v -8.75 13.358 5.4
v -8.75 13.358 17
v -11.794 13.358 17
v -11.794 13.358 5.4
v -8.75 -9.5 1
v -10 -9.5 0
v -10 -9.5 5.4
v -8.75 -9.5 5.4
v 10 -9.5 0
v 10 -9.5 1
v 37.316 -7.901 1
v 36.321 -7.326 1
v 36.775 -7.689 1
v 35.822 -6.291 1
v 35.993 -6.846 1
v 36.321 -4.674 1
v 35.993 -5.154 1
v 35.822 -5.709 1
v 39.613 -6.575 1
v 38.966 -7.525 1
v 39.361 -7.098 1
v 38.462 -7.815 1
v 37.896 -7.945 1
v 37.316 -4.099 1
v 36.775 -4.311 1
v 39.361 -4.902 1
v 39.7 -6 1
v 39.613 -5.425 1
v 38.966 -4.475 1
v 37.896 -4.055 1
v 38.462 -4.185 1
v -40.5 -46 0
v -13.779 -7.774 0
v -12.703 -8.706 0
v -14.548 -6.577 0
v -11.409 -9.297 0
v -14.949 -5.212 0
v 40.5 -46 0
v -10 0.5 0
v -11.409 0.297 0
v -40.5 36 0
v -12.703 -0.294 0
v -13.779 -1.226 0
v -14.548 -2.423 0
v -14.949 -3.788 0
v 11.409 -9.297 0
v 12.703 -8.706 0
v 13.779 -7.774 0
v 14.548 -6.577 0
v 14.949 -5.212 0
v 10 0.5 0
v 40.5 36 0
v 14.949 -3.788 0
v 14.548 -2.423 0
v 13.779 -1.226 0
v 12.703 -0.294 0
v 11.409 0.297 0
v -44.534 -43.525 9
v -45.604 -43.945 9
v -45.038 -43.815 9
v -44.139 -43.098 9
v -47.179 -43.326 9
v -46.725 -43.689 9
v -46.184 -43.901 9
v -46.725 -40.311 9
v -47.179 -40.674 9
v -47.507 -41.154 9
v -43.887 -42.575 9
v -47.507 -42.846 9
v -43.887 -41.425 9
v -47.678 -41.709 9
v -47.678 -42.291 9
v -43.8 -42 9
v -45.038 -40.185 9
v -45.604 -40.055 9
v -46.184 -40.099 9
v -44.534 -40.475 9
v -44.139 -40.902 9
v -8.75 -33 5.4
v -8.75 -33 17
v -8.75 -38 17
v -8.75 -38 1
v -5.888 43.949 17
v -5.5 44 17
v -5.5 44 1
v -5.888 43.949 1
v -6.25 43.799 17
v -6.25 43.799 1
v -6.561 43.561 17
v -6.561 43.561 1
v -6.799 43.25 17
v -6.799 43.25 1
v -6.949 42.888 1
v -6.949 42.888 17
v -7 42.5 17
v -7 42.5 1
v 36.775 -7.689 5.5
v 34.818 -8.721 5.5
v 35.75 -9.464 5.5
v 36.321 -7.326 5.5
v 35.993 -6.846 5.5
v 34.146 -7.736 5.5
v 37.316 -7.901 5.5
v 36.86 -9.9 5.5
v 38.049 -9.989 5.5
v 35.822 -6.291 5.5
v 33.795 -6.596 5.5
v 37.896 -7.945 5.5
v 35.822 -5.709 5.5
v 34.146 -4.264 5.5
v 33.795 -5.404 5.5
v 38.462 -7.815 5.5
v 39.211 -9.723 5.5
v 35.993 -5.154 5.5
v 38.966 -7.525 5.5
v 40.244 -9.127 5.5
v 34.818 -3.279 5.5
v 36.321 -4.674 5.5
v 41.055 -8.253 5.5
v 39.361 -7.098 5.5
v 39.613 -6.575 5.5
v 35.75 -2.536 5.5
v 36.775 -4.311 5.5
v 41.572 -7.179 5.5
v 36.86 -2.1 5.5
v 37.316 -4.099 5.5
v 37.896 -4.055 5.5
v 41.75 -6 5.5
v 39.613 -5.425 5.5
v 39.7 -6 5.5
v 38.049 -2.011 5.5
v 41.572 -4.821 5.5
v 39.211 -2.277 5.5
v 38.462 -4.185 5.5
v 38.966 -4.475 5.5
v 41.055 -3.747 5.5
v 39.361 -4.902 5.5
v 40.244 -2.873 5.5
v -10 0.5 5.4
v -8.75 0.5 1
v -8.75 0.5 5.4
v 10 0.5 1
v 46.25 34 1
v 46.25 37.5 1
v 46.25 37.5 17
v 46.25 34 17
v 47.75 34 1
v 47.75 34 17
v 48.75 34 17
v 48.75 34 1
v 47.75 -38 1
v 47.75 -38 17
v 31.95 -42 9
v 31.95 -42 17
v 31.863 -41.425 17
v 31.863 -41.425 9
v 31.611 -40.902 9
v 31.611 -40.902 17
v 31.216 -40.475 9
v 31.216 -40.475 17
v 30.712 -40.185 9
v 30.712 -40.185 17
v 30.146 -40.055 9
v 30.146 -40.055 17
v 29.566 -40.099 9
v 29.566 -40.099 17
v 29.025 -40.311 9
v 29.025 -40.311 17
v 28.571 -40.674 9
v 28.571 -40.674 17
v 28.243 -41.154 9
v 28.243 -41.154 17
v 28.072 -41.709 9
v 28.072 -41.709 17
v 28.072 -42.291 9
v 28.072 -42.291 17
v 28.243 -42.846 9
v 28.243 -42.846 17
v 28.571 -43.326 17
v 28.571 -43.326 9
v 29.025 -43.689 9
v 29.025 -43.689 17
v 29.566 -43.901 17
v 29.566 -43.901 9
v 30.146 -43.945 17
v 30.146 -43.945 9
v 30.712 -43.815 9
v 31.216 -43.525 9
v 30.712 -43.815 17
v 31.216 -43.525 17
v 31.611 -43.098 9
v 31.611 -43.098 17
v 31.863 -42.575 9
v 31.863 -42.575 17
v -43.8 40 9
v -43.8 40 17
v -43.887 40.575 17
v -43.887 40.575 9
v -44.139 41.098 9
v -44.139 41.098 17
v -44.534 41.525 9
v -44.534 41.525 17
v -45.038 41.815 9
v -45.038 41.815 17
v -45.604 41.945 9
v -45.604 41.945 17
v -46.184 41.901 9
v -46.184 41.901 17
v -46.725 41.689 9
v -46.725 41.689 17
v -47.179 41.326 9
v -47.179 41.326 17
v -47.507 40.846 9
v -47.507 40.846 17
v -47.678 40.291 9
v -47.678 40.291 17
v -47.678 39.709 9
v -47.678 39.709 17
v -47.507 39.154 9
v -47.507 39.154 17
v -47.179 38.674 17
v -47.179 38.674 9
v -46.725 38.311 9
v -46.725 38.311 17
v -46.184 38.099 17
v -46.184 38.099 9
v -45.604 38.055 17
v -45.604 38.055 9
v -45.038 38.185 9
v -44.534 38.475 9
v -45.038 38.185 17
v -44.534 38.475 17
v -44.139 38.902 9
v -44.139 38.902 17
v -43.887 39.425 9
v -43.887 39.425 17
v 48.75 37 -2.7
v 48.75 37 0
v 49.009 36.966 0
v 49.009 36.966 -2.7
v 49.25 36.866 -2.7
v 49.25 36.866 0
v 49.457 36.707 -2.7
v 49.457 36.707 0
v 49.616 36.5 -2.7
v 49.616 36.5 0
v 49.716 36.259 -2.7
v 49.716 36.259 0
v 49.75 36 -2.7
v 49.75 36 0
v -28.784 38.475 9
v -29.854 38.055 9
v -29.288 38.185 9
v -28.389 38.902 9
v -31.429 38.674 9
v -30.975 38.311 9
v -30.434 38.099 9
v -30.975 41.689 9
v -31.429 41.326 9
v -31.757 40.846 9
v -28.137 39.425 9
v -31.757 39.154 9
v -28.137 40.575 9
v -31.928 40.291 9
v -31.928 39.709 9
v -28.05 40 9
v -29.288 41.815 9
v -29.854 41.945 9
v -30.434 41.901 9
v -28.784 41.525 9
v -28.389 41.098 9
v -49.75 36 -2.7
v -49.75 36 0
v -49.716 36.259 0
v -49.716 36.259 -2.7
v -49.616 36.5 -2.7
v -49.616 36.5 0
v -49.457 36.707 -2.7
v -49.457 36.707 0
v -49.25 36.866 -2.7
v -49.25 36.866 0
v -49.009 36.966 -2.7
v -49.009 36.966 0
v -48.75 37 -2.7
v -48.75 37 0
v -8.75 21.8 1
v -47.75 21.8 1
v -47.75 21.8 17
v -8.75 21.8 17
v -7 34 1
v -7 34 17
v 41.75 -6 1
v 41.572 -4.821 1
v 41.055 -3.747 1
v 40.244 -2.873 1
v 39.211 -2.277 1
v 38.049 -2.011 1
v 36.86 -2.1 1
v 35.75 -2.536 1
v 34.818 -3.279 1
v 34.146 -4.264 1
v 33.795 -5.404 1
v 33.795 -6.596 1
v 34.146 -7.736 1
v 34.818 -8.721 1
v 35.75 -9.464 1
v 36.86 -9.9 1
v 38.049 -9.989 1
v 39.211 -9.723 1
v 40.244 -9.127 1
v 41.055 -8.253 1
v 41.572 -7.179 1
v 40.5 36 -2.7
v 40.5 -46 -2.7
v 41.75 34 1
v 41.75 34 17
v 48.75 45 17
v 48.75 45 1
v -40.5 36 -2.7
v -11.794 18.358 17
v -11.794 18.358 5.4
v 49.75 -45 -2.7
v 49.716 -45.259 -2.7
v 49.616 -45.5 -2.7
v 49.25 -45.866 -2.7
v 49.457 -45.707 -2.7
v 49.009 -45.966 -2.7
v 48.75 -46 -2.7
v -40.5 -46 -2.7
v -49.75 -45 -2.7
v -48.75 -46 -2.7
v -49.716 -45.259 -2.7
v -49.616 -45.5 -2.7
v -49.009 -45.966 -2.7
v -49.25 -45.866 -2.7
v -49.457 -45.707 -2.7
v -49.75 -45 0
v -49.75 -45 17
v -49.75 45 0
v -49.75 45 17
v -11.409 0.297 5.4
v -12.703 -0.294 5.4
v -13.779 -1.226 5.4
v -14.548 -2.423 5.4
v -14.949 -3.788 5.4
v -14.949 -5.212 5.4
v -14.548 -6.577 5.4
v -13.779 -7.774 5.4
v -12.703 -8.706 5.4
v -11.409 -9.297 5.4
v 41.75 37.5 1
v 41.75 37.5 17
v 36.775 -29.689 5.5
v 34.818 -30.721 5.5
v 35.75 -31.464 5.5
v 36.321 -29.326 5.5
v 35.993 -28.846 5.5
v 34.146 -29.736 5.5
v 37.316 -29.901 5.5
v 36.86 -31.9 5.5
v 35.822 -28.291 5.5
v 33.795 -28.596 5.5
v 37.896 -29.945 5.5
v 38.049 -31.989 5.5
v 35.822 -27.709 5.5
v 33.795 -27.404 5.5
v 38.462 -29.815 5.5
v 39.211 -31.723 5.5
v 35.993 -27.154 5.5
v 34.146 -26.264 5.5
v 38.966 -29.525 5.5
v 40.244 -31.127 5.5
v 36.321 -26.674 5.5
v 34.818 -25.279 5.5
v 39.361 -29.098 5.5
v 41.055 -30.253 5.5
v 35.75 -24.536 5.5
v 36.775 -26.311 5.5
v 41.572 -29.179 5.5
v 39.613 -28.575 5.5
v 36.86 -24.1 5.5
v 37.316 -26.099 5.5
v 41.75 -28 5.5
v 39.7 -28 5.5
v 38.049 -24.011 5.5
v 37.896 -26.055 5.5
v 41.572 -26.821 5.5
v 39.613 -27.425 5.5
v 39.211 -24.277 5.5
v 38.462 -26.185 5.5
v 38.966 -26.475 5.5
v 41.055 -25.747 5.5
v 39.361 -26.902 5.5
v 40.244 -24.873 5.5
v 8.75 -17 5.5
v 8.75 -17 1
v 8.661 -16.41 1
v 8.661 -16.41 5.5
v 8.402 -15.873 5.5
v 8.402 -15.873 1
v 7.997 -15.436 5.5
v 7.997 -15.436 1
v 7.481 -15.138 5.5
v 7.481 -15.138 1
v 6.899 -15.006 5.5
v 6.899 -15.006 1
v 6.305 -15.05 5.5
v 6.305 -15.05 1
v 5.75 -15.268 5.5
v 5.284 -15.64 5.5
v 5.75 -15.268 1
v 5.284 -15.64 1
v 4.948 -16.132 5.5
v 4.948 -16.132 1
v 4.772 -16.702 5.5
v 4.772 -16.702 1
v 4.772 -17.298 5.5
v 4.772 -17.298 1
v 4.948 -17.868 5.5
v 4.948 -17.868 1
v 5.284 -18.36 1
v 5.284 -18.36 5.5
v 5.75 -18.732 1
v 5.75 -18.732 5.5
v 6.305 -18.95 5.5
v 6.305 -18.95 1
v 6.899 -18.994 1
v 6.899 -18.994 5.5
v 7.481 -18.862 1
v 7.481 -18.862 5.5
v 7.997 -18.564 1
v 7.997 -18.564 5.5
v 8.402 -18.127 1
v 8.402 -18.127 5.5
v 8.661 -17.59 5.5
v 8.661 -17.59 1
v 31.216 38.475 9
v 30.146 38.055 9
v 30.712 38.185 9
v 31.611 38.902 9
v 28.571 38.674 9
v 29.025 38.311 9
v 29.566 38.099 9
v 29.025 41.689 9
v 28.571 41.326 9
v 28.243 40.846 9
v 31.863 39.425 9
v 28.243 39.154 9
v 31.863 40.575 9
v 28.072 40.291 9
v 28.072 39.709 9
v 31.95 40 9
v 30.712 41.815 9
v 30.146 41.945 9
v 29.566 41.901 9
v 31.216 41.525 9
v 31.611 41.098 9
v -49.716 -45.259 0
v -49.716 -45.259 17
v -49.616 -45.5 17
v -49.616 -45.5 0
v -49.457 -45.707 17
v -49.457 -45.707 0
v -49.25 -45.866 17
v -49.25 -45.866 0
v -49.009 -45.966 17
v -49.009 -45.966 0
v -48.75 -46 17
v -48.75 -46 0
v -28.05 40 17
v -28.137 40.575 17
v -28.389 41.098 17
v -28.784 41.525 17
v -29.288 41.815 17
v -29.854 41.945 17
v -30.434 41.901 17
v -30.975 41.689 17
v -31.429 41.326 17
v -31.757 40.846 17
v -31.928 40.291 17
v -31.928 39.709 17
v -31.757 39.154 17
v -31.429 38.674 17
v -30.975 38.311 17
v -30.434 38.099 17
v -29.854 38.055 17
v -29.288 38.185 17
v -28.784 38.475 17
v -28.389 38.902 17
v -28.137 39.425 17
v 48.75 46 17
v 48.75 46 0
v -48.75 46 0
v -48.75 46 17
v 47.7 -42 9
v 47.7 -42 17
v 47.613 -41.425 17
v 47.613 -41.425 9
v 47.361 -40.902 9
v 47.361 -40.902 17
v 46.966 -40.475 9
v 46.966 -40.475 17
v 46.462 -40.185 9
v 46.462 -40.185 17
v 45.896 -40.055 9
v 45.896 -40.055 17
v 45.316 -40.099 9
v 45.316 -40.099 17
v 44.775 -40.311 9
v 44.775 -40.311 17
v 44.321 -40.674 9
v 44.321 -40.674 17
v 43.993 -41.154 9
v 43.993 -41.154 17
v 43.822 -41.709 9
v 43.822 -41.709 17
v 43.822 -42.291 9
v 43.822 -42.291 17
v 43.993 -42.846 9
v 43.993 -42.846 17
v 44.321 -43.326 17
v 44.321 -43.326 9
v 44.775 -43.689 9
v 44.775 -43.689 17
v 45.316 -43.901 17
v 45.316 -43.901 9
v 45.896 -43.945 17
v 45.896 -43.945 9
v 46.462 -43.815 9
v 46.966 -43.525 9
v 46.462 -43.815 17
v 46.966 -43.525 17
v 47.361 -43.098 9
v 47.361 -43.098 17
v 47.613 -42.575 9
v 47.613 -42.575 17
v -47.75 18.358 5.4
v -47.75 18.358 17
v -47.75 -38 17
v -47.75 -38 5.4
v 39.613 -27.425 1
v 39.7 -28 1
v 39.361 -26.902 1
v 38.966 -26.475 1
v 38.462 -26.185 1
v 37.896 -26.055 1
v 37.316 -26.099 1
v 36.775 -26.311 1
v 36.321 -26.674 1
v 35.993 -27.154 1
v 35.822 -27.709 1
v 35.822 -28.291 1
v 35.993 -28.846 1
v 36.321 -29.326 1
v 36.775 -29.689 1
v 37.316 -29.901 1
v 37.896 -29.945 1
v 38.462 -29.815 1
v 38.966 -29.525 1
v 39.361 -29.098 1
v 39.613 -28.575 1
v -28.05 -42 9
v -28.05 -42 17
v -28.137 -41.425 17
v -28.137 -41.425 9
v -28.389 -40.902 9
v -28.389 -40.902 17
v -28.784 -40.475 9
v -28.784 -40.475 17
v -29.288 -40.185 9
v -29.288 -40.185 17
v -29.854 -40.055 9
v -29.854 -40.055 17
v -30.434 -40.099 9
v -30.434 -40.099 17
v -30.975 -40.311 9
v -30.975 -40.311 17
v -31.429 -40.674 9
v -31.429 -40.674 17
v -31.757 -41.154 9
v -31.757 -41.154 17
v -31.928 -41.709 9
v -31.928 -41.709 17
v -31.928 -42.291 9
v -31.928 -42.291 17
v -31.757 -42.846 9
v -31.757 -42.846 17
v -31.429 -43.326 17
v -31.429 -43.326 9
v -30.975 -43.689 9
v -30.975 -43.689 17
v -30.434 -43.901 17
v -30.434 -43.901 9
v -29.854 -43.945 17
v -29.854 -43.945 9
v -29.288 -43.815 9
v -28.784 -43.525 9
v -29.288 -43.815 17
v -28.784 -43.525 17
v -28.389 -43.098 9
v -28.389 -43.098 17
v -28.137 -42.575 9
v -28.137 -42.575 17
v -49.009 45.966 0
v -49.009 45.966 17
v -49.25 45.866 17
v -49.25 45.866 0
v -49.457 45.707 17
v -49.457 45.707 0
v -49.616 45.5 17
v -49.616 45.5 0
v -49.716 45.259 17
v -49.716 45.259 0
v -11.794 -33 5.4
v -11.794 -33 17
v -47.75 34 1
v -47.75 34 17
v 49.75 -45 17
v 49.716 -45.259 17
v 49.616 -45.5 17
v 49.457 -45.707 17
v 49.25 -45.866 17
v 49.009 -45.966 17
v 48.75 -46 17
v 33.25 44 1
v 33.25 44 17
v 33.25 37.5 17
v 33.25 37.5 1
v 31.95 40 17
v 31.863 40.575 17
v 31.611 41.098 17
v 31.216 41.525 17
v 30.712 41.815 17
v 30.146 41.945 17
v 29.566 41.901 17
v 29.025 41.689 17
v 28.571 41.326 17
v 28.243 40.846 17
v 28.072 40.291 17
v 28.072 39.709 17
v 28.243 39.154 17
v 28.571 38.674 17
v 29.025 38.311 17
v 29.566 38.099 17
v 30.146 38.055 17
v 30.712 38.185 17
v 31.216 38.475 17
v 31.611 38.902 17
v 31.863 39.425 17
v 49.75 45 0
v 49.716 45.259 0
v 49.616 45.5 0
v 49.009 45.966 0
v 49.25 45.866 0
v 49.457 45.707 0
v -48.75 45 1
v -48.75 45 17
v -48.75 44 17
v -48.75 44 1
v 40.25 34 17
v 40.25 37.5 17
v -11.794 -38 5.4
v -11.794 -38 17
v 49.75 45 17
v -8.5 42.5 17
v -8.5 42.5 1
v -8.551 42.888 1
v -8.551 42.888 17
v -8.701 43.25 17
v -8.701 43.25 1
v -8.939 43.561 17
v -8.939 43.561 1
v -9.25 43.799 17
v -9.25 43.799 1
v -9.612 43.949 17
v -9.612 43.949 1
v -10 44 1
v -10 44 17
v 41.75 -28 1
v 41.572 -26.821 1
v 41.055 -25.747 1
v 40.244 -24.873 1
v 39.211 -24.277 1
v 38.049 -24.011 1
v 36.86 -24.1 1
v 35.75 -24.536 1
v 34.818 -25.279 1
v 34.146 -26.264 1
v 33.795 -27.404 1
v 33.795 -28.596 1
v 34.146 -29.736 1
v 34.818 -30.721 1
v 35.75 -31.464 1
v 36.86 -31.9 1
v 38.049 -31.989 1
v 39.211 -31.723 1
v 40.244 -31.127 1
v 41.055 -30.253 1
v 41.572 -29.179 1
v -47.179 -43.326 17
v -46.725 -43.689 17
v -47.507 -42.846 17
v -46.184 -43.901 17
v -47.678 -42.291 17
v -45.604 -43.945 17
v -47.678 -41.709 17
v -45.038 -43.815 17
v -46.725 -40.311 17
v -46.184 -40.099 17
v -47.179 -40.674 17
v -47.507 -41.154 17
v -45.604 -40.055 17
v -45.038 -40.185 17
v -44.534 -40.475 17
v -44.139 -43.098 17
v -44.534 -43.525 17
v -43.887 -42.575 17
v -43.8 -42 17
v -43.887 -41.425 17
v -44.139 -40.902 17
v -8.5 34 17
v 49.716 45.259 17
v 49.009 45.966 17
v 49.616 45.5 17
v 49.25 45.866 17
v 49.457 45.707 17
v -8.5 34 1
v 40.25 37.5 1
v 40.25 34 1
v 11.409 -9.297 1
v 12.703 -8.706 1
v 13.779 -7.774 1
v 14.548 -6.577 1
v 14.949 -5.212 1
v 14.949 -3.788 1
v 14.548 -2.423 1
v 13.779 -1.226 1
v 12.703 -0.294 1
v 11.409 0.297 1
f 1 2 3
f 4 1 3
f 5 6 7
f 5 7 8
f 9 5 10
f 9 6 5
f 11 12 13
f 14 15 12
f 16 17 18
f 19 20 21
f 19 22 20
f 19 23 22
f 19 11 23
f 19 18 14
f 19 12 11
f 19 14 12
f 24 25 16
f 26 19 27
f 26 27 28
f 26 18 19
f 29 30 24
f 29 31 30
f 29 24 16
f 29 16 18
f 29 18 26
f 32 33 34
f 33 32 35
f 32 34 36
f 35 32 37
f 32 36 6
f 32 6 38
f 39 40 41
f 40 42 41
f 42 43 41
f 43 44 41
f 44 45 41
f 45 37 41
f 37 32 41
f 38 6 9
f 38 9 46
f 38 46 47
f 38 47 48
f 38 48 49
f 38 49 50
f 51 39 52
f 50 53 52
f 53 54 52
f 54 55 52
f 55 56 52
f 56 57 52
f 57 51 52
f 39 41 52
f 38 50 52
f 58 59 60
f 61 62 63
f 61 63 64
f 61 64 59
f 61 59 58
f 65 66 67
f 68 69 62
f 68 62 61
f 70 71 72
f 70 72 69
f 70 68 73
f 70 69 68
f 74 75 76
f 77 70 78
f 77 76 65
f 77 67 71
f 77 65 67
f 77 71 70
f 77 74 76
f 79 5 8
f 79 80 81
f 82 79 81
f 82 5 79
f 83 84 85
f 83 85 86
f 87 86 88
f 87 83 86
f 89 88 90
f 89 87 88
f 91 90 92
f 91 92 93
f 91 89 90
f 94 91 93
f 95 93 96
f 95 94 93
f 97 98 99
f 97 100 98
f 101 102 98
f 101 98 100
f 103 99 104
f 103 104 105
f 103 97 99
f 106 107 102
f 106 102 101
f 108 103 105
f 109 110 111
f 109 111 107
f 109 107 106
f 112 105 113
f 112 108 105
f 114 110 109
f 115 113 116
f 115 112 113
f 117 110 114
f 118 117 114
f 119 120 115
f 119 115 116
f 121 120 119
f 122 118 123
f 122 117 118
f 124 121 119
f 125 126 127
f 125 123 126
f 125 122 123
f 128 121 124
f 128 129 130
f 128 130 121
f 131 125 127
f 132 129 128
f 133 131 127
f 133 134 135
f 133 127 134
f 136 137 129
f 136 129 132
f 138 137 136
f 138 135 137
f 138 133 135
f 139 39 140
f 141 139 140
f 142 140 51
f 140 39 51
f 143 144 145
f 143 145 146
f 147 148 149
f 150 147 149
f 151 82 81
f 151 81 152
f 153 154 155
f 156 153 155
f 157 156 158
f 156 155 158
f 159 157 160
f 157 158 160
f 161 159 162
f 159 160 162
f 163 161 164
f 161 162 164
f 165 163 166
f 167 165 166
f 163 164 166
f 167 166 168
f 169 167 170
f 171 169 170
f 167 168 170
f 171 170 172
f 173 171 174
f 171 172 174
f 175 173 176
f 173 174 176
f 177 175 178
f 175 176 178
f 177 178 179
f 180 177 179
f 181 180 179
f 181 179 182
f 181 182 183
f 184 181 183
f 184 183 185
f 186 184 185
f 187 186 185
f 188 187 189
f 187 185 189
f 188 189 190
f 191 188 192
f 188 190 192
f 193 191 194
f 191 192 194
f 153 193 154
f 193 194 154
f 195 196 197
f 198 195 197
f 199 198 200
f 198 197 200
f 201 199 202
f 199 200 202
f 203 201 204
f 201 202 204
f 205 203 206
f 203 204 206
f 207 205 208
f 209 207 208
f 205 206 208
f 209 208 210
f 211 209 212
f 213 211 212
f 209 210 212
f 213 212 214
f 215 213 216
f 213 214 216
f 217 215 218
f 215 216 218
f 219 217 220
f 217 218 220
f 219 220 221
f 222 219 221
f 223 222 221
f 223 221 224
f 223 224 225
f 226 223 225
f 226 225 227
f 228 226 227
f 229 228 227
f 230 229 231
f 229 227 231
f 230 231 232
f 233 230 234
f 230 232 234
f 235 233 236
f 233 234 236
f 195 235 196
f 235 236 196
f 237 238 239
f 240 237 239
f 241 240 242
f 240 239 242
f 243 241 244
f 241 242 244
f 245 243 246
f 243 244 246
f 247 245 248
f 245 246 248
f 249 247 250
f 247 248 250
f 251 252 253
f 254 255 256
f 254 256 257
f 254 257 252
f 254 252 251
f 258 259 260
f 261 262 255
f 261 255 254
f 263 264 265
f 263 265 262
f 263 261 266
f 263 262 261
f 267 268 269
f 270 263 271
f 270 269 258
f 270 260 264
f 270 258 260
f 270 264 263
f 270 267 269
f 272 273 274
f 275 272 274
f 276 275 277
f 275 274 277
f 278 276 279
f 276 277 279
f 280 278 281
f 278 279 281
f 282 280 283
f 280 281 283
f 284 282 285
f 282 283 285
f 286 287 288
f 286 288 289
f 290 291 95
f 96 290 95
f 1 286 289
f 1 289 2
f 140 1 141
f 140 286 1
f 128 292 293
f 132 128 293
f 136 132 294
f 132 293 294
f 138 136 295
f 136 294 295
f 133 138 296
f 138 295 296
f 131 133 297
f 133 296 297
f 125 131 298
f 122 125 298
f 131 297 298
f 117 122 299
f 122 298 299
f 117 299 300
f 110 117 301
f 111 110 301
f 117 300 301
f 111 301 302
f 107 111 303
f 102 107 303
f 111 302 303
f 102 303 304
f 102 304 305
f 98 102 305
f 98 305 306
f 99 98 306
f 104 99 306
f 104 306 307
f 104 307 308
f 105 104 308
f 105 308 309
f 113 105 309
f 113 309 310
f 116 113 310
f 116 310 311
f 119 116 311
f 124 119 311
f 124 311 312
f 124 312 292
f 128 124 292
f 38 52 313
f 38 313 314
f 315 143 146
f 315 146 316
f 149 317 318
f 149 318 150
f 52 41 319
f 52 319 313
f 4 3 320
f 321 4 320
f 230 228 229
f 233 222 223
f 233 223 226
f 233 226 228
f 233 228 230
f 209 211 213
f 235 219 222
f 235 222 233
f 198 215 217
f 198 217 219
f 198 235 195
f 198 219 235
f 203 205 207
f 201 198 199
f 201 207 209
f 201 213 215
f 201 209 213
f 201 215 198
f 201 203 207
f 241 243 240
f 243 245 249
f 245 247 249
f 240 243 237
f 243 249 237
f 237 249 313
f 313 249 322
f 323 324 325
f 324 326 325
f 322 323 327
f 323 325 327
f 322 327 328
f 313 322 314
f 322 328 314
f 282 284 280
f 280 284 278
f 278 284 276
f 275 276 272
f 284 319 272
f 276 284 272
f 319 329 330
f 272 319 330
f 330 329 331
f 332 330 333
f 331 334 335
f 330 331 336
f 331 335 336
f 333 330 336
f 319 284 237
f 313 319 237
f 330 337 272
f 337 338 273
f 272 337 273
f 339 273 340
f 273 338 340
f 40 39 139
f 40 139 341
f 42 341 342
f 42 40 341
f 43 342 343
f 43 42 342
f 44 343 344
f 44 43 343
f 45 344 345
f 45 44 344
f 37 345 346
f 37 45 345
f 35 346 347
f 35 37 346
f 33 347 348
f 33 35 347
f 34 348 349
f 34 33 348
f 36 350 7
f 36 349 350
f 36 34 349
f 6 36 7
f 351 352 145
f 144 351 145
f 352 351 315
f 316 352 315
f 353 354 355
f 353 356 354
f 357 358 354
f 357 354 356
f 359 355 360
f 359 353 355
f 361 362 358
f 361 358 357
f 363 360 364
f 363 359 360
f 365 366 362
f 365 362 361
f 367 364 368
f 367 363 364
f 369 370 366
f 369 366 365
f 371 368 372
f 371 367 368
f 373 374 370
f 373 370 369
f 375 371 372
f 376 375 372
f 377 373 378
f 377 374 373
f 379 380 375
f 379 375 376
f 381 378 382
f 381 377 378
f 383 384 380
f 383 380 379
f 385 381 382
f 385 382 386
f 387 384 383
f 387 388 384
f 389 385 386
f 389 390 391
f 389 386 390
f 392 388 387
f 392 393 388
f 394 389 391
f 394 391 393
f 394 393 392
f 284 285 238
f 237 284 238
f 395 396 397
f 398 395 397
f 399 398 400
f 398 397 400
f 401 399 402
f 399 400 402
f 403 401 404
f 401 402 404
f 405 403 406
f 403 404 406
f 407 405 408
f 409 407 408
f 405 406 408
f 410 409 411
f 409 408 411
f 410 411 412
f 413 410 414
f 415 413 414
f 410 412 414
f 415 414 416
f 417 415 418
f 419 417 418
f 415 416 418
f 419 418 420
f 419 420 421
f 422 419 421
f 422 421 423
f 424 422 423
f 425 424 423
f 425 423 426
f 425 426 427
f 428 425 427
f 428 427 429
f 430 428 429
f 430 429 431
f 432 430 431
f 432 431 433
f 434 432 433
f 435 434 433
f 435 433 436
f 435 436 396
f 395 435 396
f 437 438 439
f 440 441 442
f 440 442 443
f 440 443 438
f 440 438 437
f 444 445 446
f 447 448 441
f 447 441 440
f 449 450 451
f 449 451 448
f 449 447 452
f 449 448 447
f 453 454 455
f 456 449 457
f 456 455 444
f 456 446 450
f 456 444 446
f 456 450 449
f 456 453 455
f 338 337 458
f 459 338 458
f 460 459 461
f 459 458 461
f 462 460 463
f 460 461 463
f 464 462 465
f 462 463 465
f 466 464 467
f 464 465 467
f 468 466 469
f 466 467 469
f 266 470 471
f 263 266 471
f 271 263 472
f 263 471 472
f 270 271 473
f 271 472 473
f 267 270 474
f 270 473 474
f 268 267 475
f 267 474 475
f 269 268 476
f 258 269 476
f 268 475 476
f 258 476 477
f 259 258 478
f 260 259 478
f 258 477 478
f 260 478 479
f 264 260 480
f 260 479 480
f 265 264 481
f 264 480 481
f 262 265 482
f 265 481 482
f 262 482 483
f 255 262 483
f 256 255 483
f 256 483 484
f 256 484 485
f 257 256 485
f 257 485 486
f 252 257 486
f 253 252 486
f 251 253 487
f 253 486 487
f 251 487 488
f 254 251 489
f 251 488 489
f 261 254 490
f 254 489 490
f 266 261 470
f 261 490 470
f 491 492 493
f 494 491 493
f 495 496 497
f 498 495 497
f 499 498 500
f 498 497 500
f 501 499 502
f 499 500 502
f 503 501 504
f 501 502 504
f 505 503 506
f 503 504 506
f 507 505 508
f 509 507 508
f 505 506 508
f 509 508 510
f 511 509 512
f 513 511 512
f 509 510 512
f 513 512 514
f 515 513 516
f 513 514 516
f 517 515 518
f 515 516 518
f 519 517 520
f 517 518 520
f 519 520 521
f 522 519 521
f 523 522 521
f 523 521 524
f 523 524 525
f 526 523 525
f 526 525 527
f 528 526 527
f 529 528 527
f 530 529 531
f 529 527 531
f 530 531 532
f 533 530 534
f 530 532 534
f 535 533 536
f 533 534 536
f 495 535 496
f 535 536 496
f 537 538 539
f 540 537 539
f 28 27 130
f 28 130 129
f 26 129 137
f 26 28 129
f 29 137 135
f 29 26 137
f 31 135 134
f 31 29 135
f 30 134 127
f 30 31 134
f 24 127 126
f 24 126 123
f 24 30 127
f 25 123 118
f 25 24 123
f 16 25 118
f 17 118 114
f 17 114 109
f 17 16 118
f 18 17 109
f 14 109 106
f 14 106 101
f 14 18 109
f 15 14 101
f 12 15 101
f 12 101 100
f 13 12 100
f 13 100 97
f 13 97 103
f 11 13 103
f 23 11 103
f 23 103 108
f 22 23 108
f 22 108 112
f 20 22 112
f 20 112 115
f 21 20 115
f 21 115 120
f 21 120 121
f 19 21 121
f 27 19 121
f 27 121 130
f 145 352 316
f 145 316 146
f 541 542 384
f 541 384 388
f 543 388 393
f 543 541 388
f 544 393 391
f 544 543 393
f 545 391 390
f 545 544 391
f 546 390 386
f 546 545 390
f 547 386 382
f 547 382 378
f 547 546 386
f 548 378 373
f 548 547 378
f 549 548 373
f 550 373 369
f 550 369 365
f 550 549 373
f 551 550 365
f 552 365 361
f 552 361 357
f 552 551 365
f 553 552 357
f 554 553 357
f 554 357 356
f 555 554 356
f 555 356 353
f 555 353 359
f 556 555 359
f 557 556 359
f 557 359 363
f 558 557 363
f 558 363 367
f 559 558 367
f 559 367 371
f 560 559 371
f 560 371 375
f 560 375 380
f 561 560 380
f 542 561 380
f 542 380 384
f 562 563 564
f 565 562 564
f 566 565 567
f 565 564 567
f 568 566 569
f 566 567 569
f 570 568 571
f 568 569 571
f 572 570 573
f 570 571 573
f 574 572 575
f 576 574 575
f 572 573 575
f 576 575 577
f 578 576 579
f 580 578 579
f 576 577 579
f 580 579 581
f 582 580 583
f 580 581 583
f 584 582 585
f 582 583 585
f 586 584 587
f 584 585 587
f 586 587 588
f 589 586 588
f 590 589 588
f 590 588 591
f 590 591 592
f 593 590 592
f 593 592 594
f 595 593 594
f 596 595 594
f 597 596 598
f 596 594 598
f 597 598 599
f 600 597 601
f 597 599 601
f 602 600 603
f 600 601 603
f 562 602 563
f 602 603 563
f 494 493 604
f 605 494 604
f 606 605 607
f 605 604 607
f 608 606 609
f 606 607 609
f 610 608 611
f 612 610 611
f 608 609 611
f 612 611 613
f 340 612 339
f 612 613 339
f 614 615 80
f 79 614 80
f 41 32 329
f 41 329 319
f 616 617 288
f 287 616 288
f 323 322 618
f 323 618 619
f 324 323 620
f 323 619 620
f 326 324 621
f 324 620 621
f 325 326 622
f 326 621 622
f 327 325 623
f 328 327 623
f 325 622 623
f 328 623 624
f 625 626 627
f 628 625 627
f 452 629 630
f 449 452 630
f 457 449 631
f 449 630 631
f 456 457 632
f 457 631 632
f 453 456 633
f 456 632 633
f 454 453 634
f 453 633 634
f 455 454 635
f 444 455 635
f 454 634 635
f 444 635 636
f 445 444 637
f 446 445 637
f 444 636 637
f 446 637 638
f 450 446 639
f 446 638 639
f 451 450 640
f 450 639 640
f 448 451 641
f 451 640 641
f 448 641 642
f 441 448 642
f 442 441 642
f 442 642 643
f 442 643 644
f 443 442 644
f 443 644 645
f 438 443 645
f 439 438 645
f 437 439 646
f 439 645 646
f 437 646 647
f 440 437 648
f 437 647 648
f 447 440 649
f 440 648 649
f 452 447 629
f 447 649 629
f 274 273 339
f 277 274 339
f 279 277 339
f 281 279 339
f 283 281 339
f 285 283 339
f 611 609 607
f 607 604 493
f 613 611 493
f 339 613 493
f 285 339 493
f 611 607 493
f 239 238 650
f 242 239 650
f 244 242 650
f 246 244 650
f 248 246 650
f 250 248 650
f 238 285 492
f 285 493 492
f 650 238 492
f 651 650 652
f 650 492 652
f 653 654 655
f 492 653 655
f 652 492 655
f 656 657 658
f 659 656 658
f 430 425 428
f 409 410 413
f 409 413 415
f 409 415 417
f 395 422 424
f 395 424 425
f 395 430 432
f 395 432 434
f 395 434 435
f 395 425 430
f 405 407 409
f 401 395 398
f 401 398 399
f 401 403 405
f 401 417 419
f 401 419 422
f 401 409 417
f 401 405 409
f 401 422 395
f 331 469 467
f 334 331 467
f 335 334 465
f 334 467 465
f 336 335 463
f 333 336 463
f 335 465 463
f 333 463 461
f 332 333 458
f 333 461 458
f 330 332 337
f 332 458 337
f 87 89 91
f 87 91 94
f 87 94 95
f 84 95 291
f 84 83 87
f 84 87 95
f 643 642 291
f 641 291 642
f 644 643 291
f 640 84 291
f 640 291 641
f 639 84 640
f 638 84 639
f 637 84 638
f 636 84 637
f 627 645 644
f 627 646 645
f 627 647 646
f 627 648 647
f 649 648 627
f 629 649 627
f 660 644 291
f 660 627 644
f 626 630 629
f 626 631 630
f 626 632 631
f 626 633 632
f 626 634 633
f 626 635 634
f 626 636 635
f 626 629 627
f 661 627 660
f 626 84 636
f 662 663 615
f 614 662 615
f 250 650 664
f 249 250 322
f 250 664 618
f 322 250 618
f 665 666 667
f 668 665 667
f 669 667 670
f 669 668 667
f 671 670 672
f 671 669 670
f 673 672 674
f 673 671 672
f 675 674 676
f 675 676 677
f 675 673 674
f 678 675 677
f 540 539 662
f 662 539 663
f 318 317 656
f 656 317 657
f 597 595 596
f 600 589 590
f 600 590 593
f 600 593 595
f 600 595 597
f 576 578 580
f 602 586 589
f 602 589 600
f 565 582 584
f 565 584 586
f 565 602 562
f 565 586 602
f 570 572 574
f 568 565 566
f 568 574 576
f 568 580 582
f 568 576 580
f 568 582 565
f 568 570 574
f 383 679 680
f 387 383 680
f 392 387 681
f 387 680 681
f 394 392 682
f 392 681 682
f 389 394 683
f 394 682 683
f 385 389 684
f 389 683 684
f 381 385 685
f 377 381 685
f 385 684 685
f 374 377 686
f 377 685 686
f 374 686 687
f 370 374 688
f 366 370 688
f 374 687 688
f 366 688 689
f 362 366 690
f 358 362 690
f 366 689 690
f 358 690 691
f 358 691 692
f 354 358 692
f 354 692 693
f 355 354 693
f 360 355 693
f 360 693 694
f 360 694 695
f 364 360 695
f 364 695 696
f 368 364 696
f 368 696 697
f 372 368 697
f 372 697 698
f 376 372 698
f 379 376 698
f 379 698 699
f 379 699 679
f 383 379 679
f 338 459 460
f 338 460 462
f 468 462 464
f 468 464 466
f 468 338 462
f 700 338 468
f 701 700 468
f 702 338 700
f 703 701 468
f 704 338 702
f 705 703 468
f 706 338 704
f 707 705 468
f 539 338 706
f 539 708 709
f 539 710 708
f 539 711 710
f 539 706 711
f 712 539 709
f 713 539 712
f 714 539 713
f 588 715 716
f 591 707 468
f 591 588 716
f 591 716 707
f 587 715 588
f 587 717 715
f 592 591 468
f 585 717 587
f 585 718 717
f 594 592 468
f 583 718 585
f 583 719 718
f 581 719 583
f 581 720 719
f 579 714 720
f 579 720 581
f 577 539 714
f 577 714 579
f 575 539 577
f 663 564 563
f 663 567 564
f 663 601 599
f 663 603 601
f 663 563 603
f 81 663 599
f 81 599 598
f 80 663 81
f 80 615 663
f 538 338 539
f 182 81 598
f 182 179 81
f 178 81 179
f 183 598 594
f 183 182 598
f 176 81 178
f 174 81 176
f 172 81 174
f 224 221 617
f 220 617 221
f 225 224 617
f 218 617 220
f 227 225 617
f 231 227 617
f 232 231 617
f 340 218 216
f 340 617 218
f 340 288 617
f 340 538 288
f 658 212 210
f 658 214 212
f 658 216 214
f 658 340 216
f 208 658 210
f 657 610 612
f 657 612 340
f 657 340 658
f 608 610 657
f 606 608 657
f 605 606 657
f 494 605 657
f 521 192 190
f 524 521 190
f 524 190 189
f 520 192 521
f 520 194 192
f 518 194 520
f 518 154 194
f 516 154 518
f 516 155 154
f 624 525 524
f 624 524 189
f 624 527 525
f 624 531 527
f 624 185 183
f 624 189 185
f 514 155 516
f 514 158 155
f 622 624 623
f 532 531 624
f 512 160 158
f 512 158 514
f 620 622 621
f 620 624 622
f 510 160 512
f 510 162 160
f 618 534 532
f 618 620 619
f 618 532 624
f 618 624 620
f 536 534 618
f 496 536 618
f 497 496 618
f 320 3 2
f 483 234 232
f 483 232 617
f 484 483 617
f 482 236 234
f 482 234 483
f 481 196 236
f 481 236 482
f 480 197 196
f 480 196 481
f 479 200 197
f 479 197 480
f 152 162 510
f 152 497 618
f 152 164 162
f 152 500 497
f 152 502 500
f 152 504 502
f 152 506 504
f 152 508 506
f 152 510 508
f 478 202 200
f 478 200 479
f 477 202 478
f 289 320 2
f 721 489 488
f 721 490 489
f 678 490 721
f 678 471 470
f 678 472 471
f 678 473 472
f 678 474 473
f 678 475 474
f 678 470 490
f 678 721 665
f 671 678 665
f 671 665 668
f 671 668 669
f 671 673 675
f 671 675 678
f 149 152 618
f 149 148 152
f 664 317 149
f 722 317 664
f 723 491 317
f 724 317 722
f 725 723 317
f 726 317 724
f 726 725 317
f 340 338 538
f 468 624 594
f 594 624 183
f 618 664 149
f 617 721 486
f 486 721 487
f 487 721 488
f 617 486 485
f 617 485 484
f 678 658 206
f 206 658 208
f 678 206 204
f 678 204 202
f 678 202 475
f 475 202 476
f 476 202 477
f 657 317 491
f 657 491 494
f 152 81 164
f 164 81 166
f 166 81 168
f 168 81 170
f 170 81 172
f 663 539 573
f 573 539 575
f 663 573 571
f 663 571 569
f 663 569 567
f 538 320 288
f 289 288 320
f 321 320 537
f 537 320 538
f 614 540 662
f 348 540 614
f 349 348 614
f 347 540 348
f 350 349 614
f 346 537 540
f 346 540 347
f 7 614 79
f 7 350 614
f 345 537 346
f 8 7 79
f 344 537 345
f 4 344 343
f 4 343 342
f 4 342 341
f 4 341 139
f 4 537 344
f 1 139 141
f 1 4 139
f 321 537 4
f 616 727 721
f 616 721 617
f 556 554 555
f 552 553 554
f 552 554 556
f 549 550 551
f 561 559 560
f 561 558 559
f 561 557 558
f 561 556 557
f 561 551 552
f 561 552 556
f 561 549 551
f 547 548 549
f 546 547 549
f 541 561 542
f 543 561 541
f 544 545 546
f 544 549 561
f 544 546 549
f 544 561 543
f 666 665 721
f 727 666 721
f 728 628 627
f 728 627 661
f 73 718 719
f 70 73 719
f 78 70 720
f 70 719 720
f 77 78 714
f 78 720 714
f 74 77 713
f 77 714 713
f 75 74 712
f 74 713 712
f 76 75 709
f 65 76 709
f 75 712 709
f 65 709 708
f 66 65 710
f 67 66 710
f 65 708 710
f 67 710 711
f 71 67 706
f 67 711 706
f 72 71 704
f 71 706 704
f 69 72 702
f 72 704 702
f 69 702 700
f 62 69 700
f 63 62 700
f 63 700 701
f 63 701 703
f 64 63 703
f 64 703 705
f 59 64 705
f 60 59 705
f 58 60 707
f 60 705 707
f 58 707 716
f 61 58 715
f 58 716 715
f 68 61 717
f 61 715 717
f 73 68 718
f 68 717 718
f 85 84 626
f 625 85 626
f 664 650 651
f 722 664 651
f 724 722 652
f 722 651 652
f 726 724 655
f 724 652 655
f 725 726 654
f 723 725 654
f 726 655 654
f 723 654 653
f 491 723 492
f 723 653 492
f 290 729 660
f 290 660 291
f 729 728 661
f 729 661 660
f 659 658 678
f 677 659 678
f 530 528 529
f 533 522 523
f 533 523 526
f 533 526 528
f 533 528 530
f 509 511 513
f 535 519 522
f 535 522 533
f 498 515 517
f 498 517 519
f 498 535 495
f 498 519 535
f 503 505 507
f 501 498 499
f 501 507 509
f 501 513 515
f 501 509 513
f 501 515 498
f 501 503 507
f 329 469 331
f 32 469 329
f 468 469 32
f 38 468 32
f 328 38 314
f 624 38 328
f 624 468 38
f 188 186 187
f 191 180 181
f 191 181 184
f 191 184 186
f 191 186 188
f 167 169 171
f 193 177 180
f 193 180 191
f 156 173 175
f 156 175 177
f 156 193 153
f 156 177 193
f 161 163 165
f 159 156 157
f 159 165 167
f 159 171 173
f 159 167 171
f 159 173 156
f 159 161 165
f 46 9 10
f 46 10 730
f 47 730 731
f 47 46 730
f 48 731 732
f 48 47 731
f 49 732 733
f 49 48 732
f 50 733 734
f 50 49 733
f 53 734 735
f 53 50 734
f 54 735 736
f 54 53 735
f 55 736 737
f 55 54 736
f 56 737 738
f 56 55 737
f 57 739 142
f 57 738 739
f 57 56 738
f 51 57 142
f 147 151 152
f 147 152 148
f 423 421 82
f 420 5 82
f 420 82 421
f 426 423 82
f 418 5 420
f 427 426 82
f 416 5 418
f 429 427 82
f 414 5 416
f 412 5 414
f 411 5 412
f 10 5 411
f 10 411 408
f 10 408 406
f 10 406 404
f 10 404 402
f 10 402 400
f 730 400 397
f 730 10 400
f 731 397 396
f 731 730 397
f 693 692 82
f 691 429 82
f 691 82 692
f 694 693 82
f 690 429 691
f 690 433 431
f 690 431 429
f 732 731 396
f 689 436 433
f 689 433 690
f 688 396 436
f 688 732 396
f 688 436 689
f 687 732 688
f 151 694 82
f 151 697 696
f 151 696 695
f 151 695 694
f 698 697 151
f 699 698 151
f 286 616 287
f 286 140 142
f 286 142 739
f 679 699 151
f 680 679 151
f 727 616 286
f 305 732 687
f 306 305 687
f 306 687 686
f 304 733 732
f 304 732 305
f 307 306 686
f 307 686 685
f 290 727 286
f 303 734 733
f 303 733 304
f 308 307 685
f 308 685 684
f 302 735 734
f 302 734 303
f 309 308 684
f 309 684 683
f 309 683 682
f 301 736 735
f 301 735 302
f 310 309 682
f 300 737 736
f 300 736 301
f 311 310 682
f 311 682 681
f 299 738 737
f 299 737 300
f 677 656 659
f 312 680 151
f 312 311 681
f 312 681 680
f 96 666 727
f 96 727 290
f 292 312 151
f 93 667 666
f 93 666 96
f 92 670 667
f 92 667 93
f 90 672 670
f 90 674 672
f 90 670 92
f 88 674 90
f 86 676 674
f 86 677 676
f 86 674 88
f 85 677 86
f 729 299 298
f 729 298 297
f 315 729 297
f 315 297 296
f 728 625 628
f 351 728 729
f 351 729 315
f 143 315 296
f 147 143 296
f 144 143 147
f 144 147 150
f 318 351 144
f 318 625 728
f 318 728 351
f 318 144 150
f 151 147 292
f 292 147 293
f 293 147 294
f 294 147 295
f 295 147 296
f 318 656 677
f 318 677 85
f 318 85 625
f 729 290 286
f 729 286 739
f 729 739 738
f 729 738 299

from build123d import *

# Parameters (mm, degrees)
PAD020_DEPTH    = 1
PAD021_DEPTH    = 17
POCKET014_DEPTH = 16
POCKET015_DEPTH = 11.6
SKETCH036_R     = 4
SKETCH036_R_2   = 1.95
SKETCH036_R_3   = 2
PAD022_DEPTH    = 5.5
SKETCH037_R     = 1.95
POCKET016_DEPTH = 8
PAD023_DEPTH    = 2.7
POCKET017_DEPTH = 17


with BuildPart() as part:
    # Sketch032 → Pad020 (new body)
    with BuildSketch(Plane.XY):
        with BuildLine():
            Line((-49.75, 45), (-49.75, -45))
            ThreePointArc((-49.75, -45), (-49.457107, -45.707107), (-48.75, -46))
            Line((-48.75, -46), (48.75, -46))
            ThreePointArc((48.75, -46), (49.457107, -45.707107), (49.75, -45))
            Line((49.75, -45), (49.75, 45))
            ThreePointArc((49.75, 45), (49.457107, 45.707107), (48.75, 46))
            Line((48.75, 46), (-48.75, 46))
            ThreePointArc((-48.75, 46), (-49.457107, 45.707107), (-49.75, 45))
        make_face()
    extrude(amount=PAD020_DEPTH)

    # Sketch033 → Pad021 (join)
    with BuildSketch(Plane.XY):
        with BuildLine():
            Line((-49.75, 45), (-49.75, -45))
            ThreePointArc((-49.75, -45), (-49.457107, -45.707107), (-48.75, -46))
            Line((-48.75, -46), (48.75, -46))
            ThreePointArc((48.75, -46), (49.457107, -45.707107), (49.75, -45))
            Line((49.75, -45), (49.75, 45))
            ThreePointArc((49.75, 45), (49.457107, 45.707107), (48.75, 46))
            Line((48.75, 46), (-48.75, 46))
            ThreePointArc((-48.75, 46), (-49.457107, 45.707107), (-49.75, 45))
        make_face()
        Polygon((-47.75, 34), (-47.75, 21.8), (-8.75, 21.8), (-8.75, -38), (47.75, -38), (47.75, 34), align=None, mode=Mode.SUBTRACT)
    extrude(amount=PAD021_DEPTH)

    # Sketch034 (on Face14 of Pad021) → Pocket014 (cut)
    with BuildSketch(Plane.XY.offset(17)):
        with BuildLine():
            Line((-48.75, 45), (-48.75, 44))
            Line((-48.75, 44), (-10, 44))
            ThreePointArc((-8.5, 42.5), (-8.93934, 43.56066), (-10, 44))
            Line((-8.5, 42.5), (-8.5, 34))
            Line((-8.5, 34), (-7, 34))
            Line((-7, 34), (-7, 42.5))
            ThreePointArc((-5.5, 44), (-6.56066, 43.56066), (-7, 42.5))
            Line((-5.5, 44), (33.25, 44))
            Line((33.25, 44), (33.25, 37.5))
            Line((33.25, 37.5), (40.25, 37.5))
            Line((40.25, 37.5), (40.25, 34))
            Line((41.75, 34), (40.25, 34))
            Line((41.75, 37.5), (41.75, 34))
            Line((41.75, 37.5), (46.25, 37.5))
            Line((46.25, 37.5), (46.25, 34))
            Line((46.25, 34), (48.75, 34))
            Line((48.75, 45), (48.75, 34))
            Line((48.75, 45), (-48.75, 45))
        make_face()
    extrude(amount=-POCKET014_DEPTH, mode=Mode.SUBTRACT)

    # Sketch035 (on Face14 of Pocket014) → Pocket015 (cut)
    with BuildSketch(Plane.XY.offset(17)):
        Polygon((-11.794, 18.358), (-47.75, 18.358), (-47.75, -38), (-11.794, -38), (-11.794, -33), (-8.75, -33), (-8.75, 13.358), (-11.794, 13.358), align=None)
    extrude(amount=-POCKET015_DEPTH, mode=Mode.SUBTRACT)

    # Sketch036 → Pad022 (join)
    with BuildSketch(Plane.XY):
        with Locations((37.75, -6)):
            Circle(SKETCH036_R)
        with Locations((37.75, -6)):
            Circle(SKETCH036_R_2, mode=Mode.SUBTRACT)
        with Locations((37.75, -28)):
            Circle(SKETCH036_R)
        with Locations((37.75, -28)):
            Circle(SKETCH036_R_2, mode=Mode.SUBTRACT)
        with Locations((6.75, -17)):
            Circle(SKETCH036_R_3)
    extrude(amount=PAD022_DEPTH)

    # Sketch037 (on Face14 of Pad022) → Pocket016 (cut)
    with BuildSketch(Plane.XY.offset(17)):
        with Locations((-45.75, -42)):
            Circle(SKETCH037_R)
        with Locations((-30, -42)):
            Circle(SKETCH037_R)
        with Locations((30, -42)):
            Circle(SKETCH037_R)
        with Locations((-45.75, 40)):
            Circle(SKETCH037_R)
        with Locations((-30, 40)):
            Circle(SKETCH037_R)
        with Locations((30, 40)):
            Circle(SKETCH037_R)
        with Locations((45.75, -42)):
            Circle(SKETCH037_R)
    extrude(amount=-POCKET016_DEPTH, mode=Mode.SUBTRACT)

    # Sketch038 (on Face4 of Pocket016) → Pad023 (join)
    with BuildSketch(Plane(origin=(0, 0, 0), x_dir=(1, 0, 0), z_dir=(0, 0, -1))):
        with BuildLine():
            Line((-40.500002, -36), (40.499998, -36))
            Line((40.499998, -36), (40.499998, 46))
            Line((48.75, 46), (40.499998, 46))
            ThreePointArc((49.75, 45), (49.457107, 45.707107), (48.75, 46))
            Line((49.75, -36), (49.75, 45))
            ThreePointArc((48.75, -37), (49.457107, -36.707107), (49.75, -36))
            Line((-48.75, -37), (48.75, -37))
            ThreePointArc((-49.75, -36), (-49.457107, -36.707107), (-48.75, -37))
            Line((-49.75, 45), (-49.75, -36))
            ThreePointArc((-48.750005, 46), (-49.457108, 45.707105), (-49.75, 45))
            Line((-48.750005, 46), (-40.500002, 46))
            Line((-40.500002, 46), (-40.500002, -36))
        make_face()
    extrude(amount=PAD023_DEPTH)

    # Sketch039 → Pocket017 (cut)
    with BuildSketch(Plane.XY):
        with BuildLine():
            ThreePointArc((-10, 0.5), (-15, -4.5), (-10, -9.5))
            Line((-10, -9.5), (10, -9.5))
            ThreePointArc((10, -9.5), (15, -4.5), (10, 0.5))
            Line((-10, 0.5), (10, 0.5))
        make_face()
    extrude(amount=POCKET017_DEPTH, mode=Mode.SUBTRACT)


solid = part.part
